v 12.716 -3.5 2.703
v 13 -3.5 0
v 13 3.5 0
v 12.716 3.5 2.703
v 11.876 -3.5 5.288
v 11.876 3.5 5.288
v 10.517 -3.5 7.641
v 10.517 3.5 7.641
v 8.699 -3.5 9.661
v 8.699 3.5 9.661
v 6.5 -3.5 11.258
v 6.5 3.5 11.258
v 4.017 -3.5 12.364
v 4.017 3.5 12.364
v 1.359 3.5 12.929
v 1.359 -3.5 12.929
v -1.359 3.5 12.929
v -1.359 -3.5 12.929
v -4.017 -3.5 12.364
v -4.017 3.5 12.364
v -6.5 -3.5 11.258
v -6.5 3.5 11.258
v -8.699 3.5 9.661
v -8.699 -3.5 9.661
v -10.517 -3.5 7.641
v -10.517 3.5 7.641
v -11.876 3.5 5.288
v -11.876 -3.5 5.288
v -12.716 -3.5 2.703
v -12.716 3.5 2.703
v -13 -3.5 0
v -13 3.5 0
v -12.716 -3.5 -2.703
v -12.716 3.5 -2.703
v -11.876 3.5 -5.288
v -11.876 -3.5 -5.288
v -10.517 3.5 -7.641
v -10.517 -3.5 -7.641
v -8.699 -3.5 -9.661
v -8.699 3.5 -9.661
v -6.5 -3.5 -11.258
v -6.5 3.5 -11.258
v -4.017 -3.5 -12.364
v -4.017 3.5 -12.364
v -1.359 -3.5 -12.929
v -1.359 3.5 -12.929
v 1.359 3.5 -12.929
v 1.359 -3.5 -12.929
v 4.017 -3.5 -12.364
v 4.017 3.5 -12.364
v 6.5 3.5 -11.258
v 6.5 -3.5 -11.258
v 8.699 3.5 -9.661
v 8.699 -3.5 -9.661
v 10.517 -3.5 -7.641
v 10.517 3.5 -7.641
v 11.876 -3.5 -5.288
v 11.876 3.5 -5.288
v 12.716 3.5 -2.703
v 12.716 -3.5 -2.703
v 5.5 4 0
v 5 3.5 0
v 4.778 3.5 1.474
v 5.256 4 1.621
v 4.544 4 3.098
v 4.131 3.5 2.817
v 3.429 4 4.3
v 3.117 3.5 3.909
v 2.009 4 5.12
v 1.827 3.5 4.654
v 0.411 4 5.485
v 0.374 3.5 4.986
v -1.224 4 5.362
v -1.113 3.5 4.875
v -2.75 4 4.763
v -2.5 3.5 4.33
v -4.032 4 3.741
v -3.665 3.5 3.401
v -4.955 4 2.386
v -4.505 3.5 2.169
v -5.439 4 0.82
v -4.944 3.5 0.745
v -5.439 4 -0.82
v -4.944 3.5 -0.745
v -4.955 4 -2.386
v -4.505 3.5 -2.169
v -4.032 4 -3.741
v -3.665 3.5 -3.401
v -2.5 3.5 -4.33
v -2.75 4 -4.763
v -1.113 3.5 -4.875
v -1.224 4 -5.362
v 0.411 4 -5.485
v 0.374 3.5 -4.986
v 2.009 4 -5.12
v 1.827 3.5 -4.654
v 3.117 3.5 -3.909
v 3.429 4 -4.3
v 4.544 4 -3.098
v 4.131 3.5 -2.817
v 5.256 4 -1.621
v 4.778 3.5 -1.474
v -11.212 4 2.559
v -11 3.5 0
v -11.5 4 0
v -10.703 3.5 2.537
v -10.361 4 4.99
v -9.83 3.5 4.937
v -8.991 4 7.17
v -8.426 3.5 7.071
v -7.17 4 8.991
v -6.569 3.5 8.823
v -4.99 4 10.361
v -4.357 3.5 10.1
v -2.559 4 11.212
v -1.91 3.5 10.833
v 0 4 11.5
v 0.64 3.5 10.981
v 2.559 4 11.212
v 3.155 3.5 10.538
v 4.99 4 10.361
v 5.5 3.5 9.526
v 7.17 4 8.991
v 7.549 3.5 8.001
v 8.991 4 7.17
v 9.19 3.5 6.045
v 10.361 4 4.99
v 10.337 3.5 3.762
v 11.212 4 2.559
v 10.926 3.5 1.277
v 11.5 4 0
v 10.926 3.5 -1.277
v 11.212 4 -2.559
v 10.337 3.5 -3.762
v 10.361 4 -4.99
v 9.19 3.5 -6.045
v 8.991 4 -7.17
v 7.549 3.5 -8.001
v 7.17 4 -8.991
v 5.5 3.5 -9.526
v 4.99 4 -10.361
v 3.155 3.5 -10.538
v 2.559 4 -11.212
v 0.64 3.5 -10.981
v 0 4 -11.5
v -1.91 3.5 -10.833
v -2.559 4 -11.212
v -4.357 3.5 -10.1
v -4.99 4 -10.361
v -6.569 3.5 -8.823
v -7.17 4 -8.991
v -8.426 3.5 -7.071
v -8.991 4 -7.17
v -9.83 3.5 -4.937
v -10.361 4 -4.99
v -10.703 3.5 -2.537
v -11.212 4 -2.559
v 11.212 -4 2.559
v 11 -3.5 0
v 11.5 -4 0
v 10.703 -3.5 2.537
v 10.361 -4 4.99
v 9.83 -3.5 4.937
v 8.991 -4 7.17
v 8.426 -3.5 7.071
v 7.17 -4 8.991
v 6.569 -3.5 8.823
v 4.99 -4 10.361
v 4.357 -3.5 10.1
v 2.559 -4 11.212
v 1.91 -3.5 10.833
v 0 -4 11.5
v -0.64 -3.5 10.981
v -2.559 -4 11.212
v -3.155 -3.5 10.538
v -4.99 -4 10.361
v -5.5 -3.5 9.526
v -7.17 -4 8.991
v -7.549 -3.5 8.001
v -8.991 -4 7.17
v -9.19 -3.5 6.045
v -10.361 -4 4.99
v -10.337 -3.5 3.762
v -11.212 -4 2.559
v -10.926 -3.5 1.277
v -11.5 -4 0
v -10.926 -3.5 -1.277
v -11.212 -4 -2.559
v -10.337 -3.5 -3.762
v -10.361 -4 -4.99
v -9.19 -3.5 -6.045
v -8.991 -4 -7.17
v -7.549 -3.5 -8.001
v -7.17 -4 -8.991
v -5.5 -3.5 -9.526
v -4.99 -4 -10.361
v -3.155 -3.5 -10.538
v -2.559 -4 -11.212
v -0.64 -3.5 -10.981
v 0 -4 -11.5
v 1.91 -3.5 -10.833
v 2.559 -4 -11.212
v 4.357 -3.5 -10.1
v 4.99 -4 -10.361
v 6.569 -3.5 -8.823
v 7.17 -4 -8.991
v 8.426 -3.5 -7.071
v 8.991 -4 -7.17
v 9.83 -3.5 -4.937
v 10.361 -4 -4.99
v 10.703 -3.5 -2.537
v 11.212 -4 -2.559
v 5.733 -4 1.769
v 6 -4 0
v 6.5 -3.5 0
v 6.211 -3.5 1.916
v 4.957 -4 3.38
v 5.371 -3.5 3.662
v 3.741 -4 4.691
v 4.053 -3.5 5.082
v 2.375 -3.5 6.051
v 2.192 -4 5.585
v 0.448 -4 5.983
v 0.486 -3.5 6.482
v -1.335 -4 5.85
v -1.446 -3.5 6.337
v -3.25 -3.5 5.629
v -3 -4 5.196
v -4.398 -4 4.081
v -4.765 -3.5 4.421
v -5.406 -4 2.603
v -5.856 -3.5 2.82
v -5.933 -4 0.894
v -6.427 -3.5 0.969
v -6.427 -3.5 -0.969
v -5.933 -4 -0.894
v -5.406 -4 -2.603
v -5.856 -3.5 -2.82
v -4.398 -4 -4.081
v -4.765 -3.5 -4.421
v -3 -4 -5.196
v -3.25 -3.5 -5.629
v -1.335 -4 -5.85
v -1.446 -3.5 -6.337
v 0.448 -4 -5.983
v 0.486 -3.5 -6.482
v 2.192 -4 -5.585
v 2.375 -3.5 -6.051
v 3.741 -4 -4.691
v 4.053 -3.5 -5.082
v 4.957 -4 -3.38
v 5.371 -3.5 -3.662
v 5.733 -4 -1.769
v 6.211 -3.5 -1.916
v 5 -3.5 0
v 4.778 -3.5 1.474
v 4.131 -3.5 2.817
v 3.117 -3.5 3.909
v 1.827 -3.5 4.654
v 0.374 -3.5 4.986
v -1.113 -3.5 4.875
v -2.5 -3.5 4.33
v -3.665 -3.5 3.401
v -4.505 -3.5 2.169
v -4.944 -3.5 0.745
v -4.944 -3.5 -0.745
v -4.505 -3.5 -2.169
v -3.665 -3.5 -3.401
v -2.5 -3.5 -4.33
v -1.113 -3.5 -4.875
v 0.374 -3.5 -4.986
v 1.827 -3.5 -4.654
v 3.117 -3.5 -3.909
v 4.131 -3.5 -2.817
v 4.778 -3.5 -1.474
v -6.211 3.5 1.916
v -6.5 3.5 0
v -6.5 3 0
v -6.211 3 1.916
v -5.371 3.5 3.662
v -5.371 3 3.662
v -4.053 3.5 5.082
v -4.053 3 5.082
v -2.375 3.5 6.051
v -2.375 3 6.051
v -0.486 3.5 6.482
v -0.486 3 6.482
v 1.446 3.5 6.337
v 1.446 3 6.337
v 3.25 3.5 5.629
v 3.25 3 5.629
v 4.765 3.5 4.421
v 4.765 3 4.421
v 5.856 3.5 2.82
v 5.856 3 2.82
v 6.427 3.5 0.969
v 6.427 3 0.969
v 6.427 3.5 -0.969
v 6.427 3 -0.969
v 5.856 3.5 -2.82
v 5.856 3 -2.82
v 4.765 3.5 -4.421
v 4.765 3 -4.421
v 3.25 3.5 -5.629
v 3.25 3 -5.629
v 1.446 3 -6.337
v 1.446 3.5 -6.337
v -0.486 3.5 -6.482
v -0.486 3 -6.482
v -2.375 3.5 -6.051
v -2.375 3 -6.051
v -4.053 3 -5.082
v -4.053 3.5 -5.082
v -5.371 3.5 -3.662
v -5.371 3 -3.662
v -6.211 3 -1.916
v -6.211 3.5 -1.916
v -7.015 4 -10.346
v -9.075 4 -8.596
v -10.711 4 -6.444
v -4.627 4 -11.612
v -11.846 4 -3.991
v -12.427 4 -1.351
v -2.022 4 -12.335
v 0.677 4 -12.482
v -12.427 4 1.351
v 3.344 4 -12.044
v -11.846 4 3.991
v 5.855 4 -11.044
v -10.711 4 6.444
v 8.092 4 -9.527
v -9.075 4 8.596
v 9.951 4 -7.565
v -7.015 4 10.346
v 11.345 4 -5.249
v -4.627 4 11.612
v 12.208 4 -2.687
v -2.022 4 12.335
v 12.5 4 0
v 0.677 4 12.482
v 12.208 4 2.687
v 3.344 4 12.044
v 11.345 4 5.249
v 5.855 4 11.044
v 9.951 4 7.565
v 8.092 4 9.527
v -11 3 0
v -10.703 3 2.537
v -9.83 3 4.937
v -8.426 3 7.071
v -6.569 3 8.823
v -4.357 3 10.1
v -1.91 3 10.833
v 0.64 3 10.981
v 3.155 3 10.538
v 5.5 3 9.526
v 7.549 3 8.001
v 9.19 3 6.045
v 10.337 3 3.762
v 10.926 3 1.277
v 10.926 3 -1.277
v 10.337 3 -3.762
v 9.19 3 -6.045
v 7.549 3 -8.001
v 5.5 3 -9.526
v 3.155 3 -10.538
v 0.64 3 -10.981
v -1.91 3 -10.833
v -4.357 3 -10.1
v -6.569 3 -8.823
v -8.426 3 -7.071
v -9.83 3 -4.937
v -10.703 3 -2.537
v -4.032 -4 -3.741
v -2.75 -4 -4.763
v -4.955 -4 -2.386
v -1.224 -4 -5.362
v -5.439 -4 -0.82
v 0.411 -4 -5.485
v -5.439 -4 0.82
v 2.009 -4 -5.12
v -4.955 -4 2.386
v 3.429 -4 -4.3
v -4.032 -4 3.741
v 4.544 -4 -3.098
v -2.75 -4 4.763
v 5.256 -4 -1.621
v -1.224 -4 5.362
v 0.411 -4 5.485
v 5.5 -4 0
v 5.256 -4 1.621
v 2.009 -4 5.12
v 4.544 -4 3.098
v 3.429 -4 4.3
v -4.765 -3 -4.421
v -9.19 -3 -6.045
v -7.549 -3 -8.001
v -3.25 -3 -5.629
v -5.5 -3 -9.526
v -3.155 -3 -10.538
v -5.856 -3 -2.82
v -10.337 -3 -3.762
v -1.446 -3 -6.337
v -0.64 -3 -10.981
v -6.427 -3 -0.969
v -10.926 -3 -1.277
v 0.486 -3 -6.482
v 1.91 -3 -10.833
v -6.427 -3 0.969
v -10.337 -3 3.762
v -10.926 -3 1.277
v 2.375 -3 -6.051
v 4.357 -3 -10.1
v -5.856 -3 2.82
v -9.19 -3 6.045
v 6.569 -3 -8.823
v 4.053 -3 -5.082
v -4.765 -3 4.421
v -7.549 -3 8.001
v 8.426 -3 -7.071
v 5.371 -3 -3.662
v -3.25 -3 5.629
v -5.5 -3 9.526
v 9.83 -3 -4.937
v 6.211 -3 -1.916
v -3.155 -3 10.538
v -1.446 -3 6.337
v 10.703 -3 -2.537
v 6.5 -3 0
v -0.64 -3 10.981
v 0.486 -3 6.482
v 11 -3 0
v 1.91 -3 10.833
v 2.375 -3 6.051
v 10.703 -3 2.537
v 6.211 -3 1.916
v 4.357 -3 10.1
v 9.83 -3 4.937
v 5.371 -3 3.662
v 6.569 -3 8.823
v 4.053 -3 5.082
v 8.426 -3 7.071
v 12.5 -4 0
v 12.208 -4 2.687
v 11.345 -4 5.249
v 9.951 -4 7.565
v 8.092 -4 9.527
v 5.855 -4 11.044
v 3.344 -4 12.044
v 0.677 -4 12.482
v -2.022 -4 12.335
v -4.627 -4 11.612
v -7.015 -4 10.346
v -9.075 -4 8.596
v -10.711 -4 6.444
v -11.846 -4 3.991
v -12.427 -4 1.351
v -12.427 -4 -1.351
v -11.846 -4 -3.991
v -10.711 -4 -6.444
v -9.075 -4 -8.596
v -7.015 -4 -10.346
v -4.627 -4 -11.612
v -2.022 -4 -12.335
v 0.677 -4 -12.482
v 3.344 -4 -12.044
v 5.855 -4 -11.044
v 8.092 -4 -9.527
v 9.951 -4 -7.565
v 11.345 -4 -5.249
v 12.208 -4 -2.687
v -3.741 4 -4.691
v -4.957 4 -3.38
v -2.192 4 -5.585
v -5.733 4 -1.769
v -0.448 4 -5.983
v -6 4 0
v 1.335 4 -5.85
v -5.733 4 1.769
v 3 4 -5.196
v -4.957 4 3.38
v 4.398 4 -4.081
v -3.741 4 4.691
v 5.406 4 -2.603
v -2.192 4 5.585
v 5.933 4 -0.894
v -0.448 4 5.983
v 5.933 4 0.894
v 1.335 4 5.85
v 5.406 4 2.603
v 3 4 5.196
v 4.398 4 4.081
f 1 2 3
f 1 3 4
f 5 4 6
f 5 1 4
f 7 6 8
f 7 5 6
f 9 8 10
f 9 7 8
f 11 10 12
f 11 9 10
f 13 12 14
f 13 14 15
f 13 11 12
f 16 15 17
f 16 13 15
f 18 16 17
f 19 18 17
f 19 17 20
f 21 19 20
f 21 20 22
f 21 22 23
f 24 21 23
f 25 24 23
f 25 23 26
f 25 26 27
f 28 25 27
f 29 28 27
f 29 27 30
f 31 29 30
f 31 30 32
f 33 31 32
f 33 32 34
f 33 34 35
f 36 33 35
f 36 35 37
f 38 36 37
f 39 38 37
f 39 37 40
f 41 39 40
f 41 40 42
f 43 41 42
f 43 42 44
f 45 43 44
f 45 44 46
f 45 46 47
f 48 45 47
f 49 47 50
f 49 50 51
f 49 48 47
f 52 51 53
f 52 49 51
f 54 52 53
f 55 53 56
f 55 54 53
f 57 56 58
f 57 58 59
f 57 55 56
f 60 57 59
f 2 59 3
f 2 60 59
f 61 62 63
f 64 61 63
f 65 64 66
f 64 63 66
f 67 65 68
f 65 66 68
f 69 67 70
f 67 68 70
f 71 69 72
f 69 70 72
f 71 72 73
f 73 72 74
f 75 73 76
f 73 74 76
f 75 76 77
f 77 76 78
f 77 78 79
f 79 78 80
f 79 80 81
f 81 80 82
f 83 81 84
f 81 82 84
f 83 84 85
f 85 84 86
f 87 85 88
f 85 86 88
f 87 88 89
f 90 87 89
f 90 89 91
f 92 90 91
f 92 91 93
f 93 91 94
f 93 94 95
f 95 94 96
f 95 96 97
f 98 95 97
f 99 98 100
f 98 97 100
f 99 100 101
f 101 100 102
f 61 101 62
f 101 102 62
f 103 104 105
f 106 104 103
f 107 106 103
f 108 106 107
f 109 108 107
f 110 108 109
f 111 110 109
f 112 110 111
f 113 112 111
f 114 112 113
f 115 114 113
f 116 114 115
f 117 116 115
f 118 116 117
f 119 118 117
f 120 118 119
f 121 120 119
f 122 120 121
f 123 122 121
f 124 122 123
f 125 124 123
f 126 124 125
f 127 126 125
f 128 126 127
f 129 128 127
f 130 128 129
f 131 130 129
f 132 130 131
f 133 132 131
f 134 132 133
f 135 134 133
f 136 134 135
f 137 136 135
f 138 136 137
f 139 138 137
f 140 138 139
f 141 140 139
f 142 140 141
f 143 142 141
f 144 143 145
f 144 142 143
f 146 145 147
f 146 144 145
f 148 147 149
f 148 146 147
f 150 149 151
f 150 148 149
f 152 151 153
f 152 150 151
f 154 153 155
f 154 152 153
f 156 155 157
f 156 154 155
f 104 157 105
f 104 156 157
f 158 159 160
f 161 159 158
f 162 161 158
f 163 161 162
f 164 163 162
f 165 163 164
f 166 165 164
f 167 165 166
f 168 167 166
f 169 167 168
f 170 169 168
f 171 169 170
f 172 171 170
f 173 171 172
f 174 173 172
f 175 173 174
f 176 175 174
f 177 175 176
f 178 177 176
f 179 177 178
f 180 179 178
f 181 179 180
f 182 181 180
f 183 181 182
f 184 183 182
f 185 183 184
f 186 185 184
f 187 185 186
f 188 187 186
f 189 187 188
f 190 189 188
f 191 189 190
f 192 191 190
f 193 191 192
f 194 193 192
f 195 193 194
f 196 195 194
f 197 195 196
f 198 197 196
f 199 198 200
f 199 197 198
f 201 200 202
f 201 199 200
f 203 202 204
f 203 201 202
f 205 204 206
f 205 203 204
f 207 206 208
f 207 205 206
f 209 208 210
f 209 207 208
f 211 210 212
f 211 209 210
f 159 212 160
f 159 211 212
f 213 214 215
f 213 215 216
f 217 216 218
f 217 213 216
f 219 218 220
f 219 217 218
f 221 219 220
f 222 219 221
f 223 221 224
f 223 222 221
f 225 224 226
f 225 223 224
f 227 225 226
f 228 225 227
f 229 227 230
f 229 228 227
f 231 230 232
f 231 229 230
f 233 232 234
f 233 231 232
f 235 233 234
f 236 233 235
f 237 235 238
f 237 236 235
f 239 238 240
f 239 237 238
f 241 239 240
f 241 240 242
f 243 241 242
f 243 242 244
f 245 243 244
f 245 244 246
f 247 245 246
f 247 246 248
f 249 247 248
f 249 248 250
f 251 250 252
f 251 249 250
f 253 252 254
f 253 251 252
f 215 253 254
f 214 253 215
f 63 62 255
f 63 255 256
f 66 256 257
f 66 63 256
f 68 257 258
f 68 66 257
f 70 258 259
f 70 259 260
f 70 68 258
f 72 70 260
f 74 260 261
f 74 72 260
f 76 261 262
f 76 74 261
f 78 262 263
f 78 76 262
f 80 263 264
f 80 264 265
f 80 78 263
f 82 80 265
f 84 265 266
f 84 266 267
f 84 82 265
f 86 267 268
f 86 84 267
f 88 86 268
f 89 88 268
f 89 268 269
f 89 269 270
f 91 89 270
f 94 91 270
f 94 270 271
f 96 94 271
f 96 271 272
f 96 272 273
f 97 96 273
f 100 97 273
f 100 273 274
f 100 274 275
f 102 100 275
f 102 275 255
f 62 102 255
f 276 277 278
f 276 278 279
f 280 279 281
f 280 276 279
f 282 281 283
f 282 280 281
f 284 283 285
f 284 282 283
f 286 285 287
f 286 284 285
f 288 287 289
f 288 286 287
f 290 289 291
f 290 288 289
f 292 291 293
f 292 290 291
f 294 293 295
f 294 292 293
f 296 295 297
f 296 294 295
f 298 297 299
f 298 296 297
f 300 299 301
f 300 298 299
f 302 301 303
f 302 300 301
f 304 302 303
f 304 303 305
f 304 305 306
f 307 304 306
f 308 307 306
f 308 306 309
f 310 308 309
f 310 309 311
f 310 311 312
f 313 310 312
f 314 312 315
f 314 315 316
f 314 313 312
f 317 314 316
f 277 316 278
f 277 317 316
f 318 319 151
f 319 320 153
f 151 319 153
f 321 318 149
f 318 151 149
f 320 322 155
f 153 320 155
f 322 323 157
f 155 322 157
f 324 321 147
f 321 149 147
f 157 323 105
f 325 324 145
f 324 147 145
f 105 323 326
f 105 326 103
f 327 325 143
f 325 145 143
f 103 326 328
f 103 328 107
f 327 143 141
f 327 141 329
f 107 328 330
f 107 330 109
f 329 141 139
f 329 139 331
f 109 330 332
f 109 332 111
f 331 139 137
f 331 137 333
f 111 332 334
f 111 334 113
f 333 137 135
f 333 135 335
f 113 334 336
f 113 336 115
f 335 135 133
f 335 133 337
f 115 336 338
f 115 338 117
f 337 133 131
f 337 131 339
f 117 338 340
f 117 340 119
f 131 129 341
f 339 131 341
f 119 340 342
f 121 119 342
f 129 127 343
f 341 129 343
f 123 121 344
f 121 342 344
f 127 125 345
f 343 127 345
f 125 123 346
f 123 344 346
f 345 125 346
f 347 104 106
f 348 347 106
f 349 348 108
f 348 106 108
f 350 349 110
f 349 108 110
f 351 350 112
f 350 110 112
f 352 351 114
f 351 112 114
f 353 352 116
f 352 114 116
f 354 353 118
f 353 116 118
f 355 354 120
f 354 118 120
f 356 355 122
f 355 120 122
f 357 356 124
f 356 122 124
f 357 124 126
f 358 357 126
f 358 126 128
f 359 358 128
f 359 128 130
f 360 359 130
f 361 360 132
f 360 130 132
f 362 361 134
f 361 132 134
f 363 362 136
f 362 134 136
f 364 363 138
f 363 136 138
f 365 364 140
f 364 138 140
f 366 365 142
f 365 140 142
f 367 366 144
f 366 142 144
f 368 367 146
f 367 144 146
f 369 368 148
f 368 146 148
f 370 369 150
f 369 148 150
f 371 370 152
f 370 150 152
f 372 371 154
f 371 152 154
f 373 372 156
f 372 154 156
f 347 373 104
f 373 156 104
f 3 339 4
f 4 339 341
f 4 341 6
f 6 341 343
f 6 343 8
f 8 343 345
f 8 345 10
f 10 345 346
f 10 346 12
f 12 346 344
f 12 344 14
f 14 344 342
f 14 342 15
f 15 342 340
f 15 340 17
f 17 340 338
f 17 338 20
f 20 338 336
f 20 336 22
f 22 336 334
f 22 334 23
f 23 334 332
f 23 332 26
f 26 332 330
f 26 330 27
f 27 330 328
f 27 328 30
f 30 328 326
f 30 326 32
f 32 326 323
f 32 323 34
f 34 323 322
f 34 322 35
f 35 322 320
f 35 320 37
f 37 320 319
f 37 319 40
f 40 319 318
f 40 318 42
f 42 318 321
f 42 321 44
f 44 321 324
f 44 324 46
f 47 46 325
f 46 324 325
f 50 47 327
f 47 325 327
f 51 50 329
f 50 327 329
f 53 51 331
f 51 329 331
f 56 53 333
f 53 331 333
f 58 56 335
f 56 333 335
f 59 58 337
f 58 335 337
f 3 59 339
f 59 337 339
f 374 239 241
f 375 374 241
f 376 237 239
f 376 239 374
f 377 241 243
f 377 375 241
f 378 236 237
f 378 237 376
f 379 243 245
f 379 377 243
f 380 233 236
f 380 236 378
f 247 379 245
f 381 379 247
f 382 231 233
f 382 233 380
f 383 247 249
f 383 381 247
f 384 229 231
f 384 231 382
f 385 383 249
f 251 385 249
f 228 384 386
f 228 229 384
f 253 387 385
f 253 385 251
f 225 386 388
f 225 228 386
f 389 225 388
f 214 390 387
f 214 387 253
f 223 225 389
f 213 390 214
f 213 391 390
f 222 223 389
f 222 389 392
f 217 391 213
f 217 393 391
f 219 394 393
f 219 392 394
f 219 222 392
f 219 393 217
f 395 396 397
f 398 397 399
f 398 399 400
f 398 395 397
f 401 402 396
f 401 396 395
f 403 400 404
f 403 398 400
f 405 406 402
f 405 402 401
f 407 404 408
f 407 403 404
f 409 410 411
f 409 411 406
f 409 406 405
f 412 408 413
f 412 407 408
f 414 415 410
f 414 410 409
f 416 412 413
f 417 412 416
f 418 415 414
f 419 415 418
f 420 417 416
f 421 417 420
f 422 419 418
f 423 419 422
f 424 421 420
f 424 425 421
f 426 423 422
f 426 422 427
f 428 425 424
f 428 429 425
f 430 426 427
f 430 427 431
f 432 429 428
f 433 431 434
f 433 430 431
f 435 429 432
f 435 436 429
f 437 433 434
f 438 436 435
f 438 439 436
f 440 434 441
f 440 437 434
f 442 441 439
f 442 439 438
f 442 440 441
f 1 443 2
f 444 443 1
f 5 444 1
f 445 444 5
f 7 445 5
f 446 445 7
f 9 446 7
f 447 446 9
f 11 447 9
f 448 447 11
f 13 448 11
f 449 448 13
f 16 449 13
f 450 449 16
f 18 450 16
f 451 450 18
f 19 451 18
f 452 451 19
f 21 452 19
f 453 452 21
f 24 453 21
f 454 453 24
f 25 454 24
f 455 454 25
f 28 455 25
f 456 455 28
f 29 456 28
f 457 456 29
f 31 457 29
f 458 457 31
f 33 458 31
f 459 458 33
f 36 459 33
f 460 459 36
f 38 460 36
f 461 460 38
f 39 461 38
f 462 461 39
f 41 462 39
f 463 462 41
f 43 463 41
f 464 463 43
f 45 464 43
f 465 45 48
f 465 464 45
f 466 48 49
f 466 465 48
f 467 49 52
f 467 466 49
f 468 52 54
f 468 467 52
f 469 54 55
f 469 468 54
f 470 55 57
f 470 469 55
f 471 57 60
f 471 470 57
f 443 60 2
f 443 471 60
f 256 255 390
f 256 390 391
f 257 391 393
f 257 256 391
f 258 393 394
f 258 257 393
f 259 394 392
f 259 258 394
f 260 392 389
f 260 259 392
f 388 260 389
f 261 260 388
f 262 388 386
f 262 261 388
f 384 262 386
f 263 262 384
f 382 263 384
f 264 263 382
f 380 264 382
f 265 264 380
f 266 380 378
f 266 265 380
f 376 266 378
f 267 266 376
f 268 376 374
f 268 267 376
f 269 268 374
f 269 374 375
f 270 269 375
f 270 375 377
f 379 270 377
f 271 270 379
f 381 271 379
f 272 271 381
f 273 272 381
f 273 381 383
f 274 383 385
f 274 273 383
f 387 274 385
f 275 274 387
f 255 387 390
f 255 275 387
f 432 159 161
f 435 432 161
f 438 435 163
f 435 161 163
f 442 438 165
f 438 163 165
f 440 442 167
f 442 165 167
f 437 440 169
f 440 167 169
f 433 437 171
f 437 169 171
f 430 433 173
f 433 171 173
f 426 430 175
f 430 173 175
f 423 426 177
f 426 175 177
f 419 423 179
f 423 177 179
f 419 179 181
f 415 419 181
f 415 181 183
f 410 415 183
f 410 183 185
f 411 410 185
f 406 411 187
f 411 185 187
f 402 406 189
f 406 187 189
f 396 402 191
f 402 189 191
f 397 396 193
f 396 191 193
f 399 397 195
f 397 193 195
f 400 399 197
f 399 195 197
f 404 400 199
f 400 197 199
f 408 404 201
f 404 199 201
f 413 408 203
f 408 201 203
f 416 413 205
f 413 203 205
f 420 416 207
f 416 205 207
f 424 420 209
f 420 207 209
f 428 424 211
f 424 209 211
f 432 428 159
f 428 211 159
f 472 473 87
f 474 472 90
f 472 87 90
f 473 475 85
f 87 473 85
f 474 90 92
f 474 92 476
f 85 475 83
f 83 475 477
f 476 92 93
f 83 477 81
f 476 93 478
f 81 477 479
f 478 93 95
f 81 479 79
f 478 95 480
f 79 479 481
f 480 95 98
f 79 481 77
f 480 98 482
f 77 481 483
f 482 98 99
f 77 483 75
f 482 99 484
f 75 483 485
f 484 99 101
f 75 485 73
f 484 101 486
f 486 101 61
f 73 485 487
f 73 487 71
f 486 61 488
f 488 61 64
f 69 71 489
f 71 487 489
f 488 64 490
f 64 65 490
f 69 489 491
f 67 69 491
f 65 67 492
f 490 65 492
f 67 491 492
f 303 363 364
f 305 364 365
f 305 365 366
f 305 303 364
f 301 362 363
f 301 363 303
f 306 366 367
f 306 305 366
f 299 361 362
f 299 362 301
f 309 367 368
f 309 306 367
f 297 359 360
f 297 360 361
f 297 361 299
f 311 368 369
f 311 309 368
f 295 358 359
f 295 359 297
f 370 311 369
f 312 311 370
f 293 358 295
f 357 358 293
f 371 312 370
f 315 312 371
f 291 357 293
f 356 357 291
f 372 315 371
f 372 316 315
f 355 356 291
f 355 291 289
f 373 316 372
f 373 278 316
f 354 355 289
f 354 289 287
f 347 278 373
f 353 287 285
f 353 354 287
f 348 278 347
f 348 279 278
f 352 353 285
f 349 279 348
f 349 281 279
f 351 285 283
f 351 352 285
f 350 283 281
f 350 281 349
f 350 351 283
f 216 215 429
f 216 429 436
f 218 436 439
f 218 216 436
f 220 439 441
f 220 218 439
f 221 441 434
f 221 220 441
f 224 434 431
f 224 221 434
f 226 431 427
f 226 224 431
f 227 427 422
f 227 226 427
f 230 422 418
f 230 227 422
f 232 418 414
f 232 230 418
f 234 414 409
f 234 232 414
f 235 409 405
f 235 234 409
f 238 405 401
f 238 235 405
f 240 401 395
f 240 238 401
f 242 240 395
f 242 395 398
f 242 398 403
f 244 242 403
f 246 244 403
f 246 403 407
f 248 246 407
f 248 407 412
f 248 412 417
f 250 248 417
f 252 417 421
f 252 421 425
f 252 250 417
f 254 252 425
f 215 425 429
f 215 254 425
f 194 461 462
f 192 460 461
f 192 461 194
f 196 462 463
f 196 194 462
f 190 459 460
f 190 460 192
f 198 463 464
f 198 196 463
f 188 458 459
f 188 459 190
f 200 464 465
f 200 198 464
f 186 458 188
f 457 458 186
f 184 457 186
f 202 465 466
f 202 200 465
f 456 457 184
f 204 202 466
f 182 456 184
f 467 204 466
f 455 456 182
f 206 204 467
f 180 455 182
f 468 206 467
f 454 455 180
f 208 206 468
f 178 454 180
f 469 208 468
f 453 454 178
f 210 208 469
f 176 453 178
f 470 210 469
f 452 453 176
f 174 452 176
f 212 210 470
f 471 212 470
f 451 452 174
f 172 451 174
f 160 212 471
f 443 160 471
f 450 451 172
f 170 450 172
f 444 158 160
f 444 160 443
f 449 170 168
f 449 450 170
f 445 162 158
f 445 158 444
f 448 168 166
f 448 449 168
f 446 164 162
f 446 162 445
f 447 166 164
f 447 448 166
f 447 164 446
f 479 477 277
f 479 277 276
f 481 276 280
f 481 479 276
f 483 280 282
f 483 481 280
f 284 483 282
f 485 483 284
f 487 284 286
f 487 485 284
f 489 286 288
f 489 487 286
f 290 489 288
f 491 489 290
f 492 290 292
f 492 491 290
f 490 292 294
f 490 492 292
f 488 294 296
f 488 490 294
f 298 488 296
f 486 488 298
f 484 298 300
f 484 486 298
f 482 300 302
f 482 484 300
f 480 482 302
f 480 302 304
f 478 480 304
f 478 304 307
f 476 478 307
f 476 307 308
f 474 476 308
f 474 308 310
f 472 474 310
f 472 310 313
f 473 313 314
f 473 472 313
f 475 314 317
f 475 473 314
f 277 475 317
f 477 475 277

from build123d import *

# Parameters (mm, degrees)
F0_R     = 13
F0_R_2   = 5
F1_DEPTH = 4
F2_R     = 11
F2_R_2   = 6.5
F4_DEPTH = 1
F3_R     = 11
F3_R_2   = 6.5
F5_DEPTH = 1
F6_SIZE  = 0.5


with BuildPart() as f1:
    # F0 (on Front) → F1 (new body, symmetric)
    with BuildSketch(Plane.XZ):
        Circle(F0_R)
        Circle(F0_R_2, mode=Mode.SUBTRACT)
    extrude(amount=F1_DEPTH, both=True)

    # F2 (on face) → F4 (cut)
    with BuildSketch(Plane(origin=(0, 4, 0), x_dir=(-1, 0, 0), z_dir=(0, 1, 0))):
        Circle(F2_R)
        Circle(F2_R_2, mode=Mode.SUBTRACT)
    extrude(amount=-F4_DEPTH, mode=Mode.SUBTRACT)

    # F3 (on face) → F5 (cut)
    with BuildSketch(Plane.XZ.offset(4)):
        Circle(F3_R)
        Circle(F3_R_2, mode=Mode.SUBTRACT)
    extrude(amount=-F5_DEPTH, mode=Mode.SUBTRACT)

    # F6
    f6_edges = [f1.edges().sort_by_distance(p)[0] for p in [
        (-13, 4, 0),
        (-13, -4, 0),
        (-5, -4, 0),
        (-5, 4, 0),
        (6.5, 4, 0),
        (11, 4, 0),
        (-11, -4, 0),
        (-6.5, -4, 0),
    ]]
    chamfer(f6_edges, length=F6_SIZE)


solid = f1.part
